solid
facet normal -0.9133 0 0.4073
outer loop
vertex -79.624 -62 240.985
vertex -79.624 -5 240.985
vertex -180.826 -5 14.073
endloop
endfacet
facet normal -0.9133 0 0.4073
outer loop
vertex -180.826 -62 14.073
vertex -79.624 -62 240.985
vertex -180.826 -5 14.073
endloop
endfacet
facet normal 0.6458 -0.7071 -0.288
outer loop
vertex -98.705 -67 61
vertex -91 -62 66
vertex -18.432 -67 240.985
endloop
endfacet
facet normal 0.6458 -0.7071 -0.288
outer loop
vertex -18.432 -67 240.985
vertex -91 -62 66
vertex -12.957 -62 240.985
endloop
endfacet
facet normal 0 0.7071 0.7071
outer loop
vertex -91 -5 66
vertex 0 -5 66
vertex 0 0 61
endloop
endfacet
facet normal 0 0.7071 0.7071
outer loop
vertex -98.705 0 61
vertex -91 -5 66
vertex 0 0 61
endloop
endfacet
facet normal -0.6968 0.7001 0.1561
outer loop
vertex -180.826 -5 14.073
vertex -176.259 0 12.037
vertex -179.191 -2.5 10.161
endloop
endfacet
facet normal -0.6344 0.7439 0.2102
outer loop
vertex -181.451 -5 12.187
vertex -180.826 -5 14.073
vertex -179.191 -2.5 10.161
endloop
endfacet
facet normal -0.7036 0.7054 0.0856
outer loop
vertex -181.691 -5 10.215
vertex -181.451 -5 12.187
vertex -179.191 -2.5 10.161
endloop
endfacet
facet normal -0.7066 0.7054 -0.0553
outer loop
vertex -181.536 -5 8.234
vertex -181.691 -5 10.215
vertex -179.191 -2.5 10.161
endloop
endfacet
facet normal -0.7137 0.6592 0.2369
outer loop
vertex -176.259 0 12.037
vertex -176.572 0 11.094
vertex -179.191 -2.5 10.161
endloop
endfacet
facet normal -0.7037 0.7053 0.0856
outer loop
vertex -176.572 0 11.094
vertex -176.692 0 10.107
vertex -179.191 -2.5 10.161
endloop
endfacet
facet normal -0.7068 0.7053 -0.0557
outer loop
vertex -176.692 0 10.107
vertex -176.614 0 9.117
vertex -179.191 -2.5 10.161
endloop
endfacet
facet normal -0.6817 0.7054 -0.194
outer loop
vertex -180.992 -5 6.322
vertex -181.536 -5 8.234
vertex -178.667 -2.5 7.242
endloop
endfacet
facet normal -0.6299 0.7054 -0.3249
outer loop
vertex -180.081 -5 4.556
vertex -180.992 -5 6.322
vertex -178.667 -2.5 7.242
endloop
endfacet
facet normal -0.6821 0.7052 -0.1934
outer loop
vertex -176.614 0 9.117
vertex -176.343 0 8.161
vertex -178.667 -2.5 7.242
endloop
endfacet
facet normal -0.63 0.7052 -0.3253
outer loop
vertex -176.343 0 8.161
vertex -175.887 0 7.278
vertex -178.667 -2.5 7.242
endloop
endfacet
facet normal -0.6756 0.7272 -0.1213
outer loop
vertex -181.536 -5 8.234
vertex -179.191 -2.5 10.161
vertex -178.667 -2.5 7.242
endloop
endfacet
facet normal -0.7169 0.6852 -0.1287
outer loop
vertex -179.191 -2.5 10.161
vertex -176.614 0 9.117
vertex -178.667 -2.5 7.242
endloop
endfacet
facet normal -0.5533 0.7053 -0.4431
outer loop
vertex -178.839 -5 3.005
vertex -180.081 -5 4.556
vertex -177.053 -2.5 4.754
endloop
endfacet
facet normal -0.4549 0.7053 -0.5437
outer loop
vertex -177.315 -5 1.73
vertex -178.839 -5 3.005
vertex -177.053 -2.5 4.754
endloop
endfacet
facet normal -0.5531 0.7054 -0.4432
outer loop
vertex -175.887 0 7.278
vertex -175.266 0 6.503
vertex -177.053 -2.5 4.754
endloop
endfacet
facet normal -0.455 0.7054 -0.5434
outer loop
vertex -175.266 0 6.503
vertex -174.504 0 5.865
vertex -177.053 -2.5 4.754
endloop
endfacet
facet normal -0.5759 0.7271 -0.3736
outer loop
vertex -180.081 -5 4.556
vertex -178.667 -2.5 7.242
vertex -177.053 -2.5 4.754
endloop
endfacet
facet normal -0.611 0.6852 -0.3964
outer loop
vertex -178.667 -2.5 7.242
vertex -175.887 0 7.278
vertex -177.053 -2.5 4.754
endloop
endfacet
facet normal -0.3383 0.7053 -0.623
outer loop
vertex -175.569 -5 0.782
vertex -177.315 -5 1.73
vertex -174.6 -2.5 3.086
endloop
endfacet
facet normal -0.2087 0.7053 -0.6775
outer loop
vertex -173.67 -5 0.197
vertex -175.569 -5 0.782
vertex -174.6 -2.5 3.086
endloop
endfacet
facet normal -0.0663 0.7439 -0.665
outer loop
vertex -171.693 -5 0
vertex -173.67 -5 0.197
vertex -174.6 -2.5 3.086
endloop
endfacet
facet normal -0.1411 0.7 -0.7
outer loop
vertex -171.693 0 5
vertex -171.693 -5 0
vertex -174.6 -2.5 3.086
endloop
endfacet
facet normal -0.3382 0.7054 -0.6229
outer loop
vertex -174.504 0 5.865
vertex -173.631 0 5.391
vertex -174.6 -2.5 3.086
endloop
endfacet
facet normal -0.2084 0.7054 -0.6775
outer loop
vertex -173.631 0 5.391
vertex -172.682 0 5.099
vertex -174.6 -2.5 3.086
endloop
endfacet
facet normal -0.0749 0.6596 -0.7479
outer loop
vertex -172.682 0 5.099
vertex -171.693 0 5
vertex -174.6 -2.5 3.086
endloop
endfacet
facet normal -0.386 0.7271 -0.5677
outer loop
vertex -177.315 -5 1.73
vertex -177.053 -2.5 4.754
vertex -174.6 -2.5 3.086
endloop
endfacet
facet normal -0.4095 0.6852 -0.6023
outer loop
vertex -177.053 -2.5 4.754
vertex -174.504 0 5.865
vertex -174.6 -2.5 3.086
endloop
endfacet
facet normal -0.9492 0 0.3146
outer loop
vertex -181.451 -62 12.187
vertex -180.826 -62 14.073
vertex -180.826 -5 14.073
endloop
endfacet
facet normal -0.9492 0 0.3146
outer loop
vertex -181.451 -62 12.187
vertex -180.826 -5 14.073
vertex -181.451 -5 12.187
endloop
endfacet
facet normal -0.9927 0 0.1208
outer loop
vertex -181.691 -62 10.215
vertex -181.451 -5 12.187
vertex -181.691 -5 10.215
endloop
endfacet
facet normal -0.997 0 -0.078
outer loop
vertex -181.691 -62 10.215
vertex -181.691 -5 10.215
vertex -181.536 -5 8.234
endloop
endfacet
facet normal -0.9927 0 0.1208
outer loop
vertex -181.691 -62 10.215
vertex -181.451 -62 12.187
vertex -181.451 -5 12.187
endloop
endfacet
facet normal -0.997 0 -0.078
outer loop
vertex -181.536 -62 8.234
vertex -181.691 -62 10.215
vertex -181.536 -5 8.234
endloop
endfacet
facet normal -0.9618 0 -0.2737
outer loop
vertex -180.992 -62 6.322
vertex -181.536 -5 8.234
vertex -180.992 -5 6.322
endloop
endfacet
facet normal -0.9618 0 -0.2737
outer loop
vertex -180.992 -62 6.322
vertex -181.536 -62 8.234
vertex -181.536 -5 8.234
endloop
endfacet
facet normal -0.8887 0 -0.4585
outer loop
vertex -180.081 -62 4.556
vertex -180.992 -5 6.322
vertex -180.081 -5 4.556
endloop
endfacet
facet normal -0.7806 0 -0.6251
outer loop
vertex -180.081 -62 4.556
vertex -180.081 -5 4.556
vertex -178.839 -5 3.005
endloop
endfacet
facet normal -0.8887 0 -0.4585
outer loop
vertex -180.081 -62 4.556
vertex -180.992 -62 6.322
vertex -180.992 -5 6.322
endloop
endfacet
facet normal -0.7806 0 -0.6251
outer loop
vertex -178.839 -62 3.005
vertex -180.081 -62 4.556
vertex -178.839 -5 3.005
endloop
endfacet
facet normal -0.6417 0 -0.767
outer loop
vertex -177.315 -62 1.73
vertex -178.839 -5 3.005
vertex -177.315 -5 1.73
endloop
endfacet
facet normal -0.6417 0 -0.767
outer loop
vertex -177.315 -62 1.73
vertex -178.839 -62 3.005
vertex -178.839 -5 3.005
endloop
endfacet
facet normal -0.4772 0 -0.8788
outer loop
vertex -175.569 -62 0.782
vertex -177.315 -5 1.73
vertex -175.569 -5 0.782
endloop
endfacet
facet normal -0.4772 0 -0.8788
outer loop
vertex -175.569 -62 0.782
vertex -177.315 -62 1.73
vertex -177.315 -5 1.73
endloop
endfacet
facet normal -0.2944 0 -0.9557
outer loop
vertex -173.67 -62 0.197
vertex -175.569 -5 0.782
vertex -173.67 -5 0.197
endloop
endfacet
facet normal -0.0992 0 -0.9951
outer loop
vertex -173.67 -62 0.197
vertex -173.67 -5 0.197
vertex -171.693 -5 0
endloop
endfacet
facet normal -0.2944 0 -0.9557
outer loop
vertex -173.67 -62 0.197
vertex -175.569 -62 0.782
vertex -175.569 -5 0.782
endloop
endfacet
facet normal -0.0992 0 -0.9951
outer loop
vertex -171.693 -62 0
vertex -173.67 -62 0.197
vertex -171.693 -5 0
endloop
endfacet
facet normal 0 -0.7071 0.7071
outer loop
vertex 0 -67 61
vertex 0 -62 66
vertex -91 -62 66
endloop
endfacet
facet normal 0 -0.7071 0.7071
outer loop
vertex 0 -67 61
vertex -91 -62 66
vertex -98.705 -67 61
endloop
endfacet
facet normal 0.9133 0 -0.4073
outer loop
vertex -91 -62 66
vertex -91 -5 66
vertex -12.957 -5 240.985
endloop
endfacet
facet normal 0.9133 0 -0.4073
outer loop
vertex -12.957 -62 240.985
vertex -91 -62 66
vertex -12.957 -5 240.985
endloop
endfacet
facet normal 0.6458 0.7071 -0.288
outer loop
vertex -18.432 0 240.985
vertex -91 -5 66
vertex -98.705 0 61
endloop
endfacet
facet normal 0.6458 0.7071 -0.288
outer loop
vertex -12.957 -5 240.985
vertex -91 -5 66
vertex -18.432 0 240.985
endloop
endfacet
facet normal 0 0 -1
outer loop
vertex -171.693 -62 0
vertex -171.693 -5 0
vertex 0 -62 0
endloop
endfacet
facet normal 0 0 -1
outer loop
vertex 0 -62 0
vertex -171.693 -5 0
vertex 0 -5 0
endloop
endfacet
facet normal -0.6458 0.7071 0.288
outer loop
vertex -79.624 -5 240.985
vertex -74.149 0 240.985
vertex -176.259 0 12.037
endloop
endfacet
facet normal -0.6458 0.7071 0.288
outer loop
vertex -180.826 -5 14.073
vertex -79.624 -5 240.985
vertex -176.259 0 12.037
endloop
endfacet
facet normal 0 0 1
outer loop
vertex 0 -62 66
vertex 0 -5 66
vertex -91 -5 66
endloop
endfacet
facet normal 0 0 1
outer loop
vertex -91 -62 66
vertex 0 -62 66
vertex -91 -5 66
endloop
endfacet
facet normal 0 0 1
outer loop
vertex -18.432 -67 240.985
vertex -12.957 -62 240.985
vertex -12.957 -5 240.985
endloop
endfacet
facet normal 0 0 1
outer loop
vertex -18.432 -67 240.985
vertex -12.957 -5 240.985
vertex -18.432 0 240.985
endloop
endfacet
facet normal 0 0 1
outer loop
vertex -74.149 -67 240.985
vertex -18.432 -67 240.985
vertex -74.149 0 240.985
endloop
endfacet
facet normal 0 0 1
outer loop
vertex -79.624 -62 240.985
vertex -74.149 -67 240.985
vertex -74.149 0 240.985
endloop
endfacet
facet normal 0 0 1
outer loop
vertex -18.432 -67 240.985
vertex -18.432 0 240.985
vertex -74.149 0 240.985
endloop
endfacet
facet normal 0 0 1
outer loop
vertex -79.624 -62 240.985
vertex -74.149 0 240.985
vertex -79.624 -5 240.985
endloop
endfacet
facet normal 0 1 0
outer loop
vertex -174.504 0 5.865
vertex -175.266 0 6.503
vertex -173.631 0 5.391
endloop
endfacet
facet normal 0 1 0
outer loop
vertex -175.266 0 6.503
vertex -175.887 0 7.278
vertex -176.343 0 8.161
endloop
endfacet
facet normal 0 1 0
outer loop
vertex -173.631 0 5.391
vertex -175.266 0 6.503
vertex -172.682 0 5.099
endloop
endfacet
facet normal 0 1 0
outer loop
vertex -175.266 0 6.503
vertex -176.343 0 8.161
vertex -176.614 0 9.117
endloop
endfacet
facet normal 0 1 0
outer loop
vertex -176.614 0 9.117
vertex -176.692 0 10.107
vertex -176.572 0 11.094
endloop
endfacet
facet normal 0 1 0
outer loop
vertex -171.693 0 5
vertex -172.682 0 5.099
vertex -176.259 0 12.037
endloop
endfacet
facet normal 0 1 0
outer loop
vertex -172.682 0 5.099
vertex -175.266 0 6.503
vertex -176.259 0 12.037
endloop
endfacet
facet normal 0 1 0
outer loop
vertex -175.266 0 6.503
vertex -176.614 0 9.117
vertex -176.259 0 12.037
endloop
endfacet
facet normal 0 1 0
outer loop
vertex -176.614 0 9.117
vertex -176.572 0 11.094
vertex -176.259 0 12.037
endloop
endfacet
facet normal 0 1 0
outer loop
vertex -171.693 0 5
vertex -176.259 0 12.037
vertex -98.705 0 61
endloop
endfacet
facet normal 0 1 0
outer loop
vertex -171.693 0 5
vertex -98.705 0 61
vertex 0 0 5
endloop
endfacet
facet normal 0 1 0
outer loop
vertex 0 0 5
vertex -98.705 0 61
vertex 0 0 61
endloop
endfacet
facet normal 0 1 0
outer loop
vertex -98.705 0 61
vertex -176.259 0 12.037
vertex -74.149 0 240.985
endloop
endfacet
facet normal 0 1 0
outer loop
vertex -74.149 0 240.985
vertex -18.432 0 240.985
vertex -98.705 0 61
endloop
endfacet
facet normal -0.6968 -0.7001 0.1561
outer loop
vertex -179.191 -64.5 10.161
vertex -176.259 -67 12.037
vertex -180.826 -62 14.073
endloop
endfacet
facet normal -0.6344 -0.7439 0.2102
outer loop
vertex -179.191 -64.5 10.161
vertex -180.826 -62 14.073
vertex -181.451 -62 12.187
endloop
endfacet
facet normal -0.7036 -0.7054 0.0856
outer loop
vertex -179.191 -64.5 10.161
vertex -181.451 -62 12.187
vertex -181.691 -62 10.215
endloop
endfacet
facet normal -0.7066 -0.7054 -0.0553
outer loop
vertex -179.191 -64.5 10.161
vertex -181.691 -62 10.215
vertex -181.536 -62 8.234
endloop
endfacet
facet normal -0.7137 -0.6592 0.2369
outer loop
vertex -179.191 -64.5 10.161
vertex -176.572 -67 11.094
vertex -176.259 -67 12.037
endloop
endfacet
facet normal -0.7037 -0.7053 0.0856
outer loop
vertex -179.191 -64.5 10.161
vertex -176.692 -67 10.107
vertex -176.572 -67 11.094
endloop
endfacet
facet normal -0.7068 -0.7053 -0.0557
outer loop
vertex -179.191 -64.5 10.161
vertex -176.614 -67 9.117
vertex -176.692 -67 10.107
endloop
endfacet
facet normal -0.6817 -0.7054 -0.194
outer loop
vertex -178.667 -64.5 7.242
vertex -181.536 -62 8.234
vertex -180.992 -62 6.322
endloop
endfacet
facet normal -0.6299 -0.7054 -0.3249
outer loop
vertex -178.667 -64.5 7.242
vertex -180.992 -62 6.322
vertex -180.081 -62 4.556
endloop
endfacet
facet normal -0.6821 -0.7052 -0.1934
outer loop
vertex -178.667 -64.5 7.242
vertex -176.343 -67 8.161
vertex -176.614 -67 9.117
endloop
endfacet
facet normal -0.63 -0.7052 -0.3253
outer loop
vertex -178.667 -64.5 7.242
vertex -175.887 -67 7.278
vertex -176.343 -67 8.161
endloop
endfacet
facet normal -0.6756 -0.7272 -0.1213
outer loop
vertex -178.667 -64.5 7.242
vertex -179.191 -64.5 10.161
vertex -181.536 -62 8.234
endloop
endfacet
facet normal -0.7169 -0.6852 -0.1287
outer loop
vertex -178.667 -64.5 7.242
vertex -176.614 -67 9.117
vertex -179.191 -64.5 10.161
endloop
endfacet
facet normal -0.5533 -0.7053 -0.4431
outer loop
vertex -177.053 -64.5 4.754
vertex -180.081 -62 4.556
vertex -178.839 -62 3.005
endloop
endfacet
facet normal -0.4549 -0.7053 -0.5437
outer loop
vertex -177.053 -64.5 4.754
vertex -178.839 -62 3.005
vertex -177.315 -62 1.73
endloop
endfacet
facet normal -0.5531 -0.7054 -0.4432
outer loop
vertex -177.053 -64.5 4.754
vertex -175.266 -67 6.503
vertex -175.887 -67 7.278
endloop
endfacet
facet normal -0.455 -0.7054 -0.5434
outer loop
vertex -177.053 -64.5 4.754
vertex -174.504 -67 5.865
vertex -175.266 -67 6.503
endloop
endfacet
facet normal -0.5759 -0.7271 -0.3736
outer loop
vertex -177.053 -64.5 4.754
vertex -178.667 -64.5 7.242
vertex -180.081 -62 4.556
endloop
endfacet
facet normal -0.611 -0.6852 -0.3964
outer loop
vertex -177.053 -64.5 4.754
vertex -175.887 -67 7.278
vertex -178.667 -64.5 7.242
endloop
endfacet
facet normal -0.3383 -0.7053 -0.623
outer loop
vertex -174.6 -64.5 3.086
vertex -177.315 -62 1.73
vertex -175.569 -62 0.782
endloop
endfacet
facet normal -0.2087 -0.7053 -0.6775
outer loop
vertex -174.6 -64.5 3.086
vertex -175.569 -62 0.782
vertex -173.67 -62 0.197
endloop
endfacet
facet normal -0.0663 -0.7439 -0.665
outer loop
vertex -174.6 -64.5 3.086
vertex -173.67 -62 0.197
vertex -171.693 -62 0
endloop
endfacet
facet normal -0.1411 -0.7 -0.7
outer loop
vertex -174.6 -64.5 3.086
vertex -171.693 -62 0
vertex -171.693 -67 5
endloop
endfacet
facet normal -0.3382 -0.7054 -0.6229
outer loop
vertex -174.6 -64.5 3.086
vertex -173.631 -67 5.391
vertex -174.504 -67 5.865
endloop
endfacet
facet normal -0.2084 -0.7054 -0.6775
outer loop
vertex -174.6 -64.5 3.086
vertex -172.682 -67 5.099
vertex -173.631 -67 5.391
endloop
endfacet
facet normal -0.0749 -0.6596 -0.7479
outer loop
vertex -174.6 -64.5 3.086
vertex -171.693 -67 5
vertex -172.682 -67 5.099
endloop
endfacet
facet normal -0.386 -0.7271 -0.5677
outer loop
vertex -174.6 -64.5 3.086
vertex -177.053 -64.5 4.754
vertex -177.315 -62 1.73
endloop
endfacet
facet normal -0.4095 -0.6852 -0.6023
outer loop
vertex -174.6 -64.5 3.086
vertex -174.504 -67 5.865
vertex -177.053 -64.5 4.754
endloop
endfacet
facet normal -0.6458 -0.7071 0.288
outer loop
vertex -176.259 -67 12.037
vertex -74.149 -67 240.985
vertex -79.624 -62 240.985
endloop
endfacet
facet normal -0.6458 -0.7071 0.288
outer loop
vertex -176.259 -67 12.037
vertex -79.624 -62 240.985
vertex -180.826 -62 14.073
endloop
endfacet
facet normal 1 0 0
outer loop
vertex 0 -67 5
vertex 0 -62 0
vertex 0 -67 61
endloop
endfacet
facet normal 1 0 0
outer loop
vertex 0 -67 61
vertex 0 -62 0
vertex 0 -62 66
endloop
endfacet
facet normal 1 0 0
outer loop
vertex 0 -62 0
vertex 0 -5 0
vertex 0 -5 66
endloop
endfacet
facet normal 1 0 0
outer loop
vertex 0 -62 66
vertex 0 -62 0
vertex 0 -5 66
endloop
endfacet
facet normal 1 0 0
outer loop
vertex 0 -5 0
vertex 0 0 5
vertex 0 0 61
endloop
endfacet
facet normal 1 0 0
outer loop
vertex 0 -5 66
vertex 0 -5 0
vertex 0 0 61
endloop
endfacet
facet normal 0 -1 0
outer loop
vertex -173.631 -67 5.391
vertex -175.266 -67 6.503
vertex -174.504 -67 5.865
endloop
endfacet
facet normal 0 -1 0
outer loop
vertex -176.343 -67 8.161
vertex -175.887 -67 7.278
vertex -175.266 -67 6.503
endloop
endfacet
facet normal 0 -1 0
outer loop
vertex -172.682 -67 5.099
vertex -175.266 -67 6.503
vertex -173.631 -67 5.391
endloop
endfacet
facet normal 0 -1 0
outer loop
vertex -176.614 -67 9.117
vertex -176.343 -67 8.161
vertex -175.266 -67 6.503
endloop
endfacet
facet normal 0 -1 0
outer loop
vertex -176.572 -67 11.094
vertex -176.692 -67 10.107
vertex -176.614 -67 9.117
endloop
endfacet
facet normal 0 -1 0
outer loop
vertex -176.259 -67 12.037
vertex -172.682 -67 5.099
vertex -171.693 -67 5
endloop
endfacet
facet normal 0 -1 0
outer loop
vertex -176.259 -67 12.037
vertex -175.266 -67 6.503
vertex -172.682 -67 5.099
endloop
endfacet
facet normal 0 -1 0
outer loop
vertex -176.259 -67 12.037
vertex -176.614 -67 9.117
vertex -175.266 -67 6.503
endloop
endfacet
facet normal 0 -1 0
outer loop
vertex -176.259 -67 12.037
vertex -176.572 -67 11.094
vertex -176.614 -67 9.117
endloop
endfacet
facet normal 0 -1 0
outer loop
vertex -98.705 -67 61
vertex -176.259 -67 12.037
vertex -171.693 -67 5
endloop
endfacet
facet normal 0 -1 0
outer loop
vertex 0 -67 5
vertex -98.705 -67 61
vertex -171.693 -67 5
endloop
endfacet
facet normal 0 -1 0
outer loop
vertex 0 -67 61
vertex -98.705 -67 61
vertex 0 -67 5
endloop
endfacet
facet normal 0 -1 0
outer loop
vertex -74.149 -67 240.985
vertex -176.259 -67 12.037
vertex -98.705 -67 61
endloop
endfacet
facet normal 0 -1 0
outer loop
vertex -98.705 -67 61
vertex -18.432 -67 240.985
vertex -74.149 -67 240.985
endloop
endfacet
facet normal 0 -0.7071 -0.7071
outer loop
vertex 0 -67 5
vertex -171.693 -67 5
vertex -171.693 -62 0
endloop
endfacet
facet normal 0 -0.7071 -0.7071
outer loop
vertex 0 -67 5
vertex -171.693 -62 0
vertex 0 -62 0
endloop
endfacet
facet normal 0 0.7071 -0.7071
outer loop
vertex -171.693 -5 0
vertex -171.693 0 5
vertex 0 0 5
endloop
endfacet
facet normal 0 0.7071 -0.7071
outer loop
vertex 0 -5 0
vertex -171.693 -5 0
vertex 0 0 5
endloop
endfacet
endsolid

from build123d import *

# Parameters (mm, degrees)
F1_DEPTH = 67
F2_R     = 10
F3_SIZE  = 5


with BuildPart() as f1:
    # F0 (on Front) → F1 (new body)
    with BuildSketch(Plane.XZ):
        Polygon((0, 0), (0, 66), (-91, 66), (-12.957165, 240.985362), (-79.623835, 240.985362), (-187.10243, 0), align=None)
    extrude(amount=F1_DEPTH)

    # F2
    f2_edges = [f1.edges().sort_by_distance(p)[0] for p in [
        (-187.10243, -33.5, 0),
    ]]
    fillet(f2_edges, radius=F2_R)

    # F3
    f3_edges = [f1.edges().sort_by_distance(p)[0] for p in [
        (-51.978583, -67, 153.492681),
        (-51.978583, 0, 153.492681),
        (-130.224831, 0, 127.52929),
        (-130.224831, -67, 127.52929),
        (-45.5, 0, 66),
        (-45.5, -67, 66),
    ]]
    chamfer(f3_edges, length=F3_SIZE)


solid = f1.part
